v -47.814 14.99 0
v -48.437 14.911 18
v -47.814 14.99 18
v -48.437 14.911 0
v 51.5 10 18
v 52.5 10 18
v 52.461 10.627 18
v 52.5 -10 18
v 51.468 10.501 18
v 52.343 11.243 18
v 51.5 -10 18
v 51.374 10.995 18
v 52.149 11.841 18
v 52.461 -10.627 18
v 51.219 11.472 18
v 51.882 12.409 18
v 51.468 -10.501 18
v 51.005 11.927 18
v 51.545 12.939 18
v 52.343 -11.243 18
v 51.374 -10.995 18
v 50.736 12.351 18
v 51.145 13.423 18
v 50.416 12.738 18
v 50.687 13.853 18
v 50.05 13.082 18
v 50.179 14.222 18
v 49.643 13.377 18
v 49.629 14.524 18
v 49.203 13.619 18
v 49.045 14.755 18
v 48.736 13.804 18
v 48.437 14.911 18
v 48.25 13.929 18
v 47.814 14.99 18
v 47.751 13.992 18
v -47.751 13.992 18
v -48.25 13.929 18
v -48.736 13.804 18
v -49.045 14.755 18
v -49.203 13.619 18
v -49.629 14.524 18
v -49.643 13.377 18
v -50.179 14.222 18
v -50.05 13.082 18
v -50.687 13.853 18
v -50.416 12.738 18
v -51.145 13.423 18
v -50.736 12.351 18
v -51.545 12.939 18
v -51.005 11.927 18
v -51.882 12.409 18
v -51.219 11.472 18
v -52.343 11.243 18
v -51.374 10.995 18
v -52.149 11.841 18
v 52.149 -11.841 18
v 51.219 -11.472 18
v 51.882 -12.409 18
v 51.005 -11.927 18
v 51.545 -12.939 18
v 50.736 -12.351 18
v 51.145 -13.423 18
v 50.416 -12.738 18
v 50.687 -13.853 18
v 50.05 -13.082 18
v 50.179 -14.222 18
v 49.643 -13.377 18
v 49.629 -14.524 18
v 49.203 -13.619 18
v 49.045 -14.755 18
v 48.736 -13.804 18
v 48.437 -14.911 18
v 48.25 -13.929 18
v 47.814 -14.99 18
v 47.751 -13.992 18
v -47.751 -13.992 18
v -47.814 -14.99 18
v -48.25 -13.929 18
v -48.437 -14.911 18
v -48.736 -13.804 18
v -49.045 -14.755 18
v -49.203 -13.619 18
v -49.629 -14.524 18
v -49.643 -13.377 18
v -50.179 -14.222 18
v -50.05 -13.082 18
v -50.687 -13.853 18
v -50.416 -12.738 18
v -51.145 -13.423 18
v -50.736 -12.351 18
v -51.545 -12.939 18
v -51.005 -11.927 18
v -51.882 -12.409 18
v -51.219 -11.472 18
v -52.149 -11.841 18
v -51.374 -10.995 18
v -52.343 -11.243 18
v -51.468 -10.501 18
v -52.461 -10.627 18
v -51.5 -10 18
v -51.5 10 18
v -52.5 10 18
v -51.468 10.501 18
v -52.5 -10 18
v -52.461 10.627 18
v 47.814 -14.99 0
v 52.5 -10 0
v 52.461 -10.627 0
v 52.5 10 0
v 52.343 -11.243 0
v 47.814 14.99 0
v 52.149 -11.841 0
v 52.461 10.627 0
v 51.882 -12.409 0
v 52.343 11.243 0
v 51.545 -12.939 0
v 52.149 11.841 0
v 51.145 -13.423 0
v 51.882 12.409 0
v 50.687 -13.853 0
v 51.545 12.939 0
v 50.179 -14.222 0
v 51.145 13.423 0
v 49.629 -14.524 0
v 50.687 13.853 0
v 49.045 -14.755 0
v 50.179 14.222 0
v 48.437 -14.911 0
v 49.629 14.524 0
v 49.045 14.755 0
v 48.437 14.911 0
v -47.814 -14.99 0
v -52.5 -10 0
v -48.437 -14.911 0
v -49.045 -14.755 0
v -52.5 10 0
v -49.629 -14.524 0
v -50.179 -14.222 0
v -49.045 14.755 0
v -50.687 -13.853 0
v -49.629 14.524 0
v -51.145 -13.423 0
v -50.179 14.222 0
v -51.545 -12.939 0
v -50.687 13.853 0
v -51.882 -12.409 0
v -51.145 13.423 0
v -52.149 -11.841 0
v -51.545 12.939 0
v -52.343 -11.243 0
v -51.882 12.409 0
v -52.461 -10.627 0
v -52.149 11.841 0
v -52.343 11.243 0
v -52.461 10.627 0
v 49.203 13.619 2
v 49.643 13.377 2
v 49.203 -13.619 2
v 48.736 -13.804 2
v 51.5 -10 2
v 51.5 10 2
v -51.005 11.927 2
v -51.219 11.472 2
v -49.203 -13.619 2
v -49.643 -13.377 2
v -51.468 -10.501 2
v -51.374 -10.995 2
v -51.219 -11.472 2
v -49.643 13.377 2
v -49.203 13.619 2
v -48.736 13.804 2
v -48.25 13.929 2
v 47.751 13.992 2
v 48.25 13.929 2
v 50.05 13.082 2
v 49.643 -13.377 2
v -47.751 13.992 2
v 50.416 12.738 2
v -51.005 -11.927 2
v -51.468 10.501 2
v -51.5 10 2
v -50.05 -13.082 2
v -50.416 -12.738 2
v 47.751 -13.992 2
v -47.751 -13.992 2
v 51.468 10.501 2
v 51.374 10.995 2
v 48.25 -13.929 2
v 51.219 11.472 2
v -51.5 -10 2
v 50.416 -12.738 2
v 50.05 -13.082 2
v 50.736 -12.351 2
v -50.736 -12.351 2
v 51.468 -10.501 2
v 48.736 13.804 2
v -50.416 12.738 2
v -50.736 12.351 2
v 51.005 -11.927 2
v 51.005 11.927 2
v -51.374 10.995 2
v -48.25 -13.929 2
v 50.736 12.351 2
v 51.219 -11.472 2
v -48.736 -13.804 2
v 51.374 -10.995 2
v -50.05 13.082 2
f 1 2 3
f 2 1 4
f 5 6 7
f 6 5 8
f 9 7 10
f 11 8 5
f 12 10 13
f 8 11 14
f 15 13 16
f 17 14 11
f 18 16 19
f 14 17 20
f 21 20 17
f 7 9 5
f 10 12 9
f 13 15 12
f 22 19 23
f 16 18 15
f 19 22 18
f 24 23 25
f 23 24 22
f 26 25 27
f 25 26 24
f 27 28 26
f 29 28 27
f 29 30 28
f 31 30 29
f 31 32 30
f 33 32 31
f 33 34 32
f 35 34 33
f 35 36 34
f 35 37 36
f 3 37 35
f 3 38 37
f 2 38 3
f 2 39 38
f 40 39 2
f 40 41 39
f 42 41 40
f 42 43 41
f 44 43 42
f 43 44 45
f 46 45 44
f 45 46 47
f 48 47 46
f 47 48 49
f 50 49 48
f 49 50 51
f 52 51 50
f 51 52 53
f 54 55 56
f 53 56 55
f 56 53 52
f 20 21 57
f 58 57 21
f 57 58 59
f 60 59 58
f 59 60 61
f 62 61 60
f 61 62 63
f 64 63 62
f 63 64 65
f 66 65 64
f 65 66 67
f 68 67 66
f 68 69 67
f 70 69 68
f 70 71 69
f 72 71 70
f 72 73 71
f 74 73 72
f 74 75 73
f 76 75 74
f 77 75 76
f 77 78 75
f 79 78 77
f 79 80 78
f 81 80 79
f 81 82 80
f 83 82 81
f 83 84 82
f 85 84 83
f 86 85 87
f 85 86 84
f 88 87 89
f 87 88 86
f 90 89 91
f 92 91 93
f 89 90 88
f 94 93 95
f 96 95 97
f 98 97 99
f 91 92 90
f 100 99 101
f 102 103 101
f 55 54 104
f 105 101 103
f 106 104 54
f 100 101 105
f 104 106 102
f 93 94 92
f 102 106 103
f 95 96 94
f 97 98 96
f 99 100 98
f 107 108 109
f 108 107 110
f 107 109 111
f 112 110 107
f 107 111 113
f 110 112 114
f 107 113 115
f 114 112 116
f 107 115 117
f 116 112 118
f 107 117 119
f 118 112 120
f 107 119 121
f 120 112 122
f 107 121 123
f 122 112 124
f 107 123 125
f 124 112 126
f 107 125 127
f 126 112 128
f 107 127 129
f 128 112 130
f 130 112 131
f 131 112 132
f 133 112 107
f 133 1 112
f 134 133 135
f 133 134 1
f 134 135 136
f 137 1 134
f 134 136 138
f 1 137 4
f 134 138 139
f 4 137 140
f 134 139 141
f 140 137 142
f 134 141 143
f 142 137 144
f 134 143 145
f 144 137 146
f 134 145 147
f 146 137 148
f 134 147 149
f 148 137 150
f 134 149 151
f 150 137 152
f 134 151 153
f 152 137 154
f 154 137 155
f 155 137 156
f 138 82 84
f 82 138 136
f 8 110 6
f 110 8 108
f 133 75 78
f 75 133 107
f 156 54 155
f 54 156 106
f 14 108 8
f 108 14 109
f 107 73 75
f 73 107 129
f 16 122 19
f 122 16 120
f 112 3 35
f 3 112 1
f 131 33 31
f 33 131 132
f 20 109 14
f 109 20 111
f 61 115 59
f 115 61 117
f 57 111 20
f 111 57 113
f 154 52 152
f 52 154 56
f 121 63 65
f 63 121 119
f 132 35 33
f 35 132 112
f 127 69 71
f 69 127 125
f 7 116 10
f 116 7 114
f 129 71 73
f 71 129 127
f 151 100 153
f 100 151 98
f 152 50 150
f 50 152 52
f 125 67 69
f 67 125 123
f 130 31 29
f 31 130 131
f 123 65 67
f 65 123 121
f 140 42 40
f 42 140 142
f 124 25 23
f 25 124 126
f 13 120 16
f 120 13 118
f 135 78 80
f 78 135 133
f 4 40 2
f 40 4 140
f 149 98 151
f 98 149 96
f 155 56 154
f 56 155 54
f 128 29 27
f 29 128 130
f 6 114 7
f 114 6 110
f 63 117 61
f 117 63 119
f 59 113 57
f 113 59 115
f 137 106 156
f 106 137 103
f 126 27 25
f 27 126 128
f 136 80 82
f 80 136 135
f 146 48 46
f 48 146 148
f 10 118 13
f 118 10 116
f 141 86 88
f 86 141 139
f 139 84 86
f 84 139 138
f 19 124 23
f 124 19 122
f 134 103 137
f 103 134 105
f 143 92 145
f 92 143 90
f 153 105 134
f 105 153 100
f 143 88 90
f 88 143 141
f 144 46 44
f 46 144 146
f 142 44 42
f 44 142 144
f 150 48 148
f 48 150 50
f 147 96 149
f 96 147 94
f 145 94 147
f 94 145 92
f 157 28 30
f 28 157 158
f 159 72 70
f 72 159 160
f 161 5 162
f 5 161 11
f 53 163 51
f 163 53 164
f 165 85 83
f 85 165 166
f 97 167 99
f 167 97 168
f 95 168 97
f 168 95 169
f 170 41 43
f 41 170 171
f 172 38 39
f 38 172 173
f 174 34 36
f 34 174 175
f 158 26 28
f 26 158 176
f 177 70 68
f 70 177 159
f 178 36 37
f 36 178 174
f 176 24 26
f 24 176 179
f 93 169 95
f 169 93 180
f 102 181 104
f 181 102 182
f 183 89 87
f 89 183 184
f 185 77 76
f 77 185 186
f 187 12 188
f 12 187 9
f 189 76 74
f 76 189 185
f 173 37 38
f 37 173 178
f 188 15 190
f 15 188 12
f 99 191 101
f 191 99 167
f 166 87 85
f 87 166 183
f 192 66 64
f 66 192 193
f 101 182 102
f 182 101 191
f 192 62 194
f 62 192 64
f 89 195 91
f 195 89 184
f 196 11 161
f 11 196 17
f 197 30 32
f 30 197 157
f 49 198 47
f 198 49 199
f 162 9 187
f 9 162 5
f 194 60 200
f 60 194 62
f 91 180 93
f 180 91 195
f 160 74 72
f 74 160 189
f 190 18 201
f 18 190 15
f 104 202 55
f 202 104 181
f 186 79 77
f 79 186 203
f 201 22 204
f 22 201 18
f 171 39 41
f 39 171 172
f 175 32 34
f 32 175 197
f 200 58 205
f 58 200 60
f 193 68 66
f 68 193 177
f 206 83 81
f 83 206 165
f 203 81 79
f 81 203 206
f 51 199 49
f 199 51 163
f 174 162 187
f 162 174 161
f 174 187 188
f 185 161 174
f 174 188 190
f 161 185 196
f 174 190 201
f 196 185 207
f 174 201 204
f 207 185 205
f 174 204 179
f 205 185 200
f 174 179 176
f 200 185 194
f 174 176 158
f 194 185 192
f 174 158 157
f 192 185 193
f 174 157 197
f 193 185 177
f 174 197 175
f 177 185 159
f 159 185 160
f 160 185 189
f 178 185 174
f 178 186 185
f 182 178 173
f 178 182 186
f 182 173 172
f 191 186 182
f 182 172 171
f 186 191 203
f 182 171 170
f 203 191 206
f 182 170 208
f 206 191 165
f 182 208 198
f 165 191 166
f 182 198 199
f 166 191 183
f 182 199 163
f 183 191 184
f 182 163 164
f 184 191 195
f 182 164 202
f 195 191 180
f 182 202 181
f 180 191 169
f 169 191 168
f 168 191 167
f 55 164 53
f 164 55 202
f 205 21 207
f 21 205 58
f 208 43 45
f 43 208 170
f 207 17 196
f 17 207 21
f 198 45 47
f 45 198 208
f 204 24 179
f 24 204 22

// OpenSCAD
$fn = 50;


difference() {
	union() {
		hull() {
			translate(v = [-47.5000000000, 10.0000000000, 0]) {
				cylinder(h = 18, r = 5);
			}
			translate(v = [47.5000000000, 10.0000000000, 0]) {
				cylinder(h = 18, r = 5);
			}
			translate(v = [-47.5000000000, -10.0000000000, 0]) {
				cylinder(h = 18, r = 5);
			}
			translate(v = [47.5000000000, -10.0000000000, 0]) {
				cylinder(h = 18, r = 5);
			}
		}
	}
	union() {
		translate(v = [0, 0, 2]) {
			hull() {
				translate(v = [-47.5000000000, 10.0000000000, 0]) {
					cylinder(h = 16, r = 4);
				}
				translate(v = [47.5000000000, 10.0000000000, 0]) {
					cylinder(h = 16, r = 4);
				}
				translate(v = [-47.5000000000, -10.0000000000, 0]) {
					cylinder(h = 16, r = 4);
				}
				translate(v = [47.5000000000, -10.0000000000, 0]) {
					cylinder(h = 16, r = 4);
				}
			}
		}
	}
}
